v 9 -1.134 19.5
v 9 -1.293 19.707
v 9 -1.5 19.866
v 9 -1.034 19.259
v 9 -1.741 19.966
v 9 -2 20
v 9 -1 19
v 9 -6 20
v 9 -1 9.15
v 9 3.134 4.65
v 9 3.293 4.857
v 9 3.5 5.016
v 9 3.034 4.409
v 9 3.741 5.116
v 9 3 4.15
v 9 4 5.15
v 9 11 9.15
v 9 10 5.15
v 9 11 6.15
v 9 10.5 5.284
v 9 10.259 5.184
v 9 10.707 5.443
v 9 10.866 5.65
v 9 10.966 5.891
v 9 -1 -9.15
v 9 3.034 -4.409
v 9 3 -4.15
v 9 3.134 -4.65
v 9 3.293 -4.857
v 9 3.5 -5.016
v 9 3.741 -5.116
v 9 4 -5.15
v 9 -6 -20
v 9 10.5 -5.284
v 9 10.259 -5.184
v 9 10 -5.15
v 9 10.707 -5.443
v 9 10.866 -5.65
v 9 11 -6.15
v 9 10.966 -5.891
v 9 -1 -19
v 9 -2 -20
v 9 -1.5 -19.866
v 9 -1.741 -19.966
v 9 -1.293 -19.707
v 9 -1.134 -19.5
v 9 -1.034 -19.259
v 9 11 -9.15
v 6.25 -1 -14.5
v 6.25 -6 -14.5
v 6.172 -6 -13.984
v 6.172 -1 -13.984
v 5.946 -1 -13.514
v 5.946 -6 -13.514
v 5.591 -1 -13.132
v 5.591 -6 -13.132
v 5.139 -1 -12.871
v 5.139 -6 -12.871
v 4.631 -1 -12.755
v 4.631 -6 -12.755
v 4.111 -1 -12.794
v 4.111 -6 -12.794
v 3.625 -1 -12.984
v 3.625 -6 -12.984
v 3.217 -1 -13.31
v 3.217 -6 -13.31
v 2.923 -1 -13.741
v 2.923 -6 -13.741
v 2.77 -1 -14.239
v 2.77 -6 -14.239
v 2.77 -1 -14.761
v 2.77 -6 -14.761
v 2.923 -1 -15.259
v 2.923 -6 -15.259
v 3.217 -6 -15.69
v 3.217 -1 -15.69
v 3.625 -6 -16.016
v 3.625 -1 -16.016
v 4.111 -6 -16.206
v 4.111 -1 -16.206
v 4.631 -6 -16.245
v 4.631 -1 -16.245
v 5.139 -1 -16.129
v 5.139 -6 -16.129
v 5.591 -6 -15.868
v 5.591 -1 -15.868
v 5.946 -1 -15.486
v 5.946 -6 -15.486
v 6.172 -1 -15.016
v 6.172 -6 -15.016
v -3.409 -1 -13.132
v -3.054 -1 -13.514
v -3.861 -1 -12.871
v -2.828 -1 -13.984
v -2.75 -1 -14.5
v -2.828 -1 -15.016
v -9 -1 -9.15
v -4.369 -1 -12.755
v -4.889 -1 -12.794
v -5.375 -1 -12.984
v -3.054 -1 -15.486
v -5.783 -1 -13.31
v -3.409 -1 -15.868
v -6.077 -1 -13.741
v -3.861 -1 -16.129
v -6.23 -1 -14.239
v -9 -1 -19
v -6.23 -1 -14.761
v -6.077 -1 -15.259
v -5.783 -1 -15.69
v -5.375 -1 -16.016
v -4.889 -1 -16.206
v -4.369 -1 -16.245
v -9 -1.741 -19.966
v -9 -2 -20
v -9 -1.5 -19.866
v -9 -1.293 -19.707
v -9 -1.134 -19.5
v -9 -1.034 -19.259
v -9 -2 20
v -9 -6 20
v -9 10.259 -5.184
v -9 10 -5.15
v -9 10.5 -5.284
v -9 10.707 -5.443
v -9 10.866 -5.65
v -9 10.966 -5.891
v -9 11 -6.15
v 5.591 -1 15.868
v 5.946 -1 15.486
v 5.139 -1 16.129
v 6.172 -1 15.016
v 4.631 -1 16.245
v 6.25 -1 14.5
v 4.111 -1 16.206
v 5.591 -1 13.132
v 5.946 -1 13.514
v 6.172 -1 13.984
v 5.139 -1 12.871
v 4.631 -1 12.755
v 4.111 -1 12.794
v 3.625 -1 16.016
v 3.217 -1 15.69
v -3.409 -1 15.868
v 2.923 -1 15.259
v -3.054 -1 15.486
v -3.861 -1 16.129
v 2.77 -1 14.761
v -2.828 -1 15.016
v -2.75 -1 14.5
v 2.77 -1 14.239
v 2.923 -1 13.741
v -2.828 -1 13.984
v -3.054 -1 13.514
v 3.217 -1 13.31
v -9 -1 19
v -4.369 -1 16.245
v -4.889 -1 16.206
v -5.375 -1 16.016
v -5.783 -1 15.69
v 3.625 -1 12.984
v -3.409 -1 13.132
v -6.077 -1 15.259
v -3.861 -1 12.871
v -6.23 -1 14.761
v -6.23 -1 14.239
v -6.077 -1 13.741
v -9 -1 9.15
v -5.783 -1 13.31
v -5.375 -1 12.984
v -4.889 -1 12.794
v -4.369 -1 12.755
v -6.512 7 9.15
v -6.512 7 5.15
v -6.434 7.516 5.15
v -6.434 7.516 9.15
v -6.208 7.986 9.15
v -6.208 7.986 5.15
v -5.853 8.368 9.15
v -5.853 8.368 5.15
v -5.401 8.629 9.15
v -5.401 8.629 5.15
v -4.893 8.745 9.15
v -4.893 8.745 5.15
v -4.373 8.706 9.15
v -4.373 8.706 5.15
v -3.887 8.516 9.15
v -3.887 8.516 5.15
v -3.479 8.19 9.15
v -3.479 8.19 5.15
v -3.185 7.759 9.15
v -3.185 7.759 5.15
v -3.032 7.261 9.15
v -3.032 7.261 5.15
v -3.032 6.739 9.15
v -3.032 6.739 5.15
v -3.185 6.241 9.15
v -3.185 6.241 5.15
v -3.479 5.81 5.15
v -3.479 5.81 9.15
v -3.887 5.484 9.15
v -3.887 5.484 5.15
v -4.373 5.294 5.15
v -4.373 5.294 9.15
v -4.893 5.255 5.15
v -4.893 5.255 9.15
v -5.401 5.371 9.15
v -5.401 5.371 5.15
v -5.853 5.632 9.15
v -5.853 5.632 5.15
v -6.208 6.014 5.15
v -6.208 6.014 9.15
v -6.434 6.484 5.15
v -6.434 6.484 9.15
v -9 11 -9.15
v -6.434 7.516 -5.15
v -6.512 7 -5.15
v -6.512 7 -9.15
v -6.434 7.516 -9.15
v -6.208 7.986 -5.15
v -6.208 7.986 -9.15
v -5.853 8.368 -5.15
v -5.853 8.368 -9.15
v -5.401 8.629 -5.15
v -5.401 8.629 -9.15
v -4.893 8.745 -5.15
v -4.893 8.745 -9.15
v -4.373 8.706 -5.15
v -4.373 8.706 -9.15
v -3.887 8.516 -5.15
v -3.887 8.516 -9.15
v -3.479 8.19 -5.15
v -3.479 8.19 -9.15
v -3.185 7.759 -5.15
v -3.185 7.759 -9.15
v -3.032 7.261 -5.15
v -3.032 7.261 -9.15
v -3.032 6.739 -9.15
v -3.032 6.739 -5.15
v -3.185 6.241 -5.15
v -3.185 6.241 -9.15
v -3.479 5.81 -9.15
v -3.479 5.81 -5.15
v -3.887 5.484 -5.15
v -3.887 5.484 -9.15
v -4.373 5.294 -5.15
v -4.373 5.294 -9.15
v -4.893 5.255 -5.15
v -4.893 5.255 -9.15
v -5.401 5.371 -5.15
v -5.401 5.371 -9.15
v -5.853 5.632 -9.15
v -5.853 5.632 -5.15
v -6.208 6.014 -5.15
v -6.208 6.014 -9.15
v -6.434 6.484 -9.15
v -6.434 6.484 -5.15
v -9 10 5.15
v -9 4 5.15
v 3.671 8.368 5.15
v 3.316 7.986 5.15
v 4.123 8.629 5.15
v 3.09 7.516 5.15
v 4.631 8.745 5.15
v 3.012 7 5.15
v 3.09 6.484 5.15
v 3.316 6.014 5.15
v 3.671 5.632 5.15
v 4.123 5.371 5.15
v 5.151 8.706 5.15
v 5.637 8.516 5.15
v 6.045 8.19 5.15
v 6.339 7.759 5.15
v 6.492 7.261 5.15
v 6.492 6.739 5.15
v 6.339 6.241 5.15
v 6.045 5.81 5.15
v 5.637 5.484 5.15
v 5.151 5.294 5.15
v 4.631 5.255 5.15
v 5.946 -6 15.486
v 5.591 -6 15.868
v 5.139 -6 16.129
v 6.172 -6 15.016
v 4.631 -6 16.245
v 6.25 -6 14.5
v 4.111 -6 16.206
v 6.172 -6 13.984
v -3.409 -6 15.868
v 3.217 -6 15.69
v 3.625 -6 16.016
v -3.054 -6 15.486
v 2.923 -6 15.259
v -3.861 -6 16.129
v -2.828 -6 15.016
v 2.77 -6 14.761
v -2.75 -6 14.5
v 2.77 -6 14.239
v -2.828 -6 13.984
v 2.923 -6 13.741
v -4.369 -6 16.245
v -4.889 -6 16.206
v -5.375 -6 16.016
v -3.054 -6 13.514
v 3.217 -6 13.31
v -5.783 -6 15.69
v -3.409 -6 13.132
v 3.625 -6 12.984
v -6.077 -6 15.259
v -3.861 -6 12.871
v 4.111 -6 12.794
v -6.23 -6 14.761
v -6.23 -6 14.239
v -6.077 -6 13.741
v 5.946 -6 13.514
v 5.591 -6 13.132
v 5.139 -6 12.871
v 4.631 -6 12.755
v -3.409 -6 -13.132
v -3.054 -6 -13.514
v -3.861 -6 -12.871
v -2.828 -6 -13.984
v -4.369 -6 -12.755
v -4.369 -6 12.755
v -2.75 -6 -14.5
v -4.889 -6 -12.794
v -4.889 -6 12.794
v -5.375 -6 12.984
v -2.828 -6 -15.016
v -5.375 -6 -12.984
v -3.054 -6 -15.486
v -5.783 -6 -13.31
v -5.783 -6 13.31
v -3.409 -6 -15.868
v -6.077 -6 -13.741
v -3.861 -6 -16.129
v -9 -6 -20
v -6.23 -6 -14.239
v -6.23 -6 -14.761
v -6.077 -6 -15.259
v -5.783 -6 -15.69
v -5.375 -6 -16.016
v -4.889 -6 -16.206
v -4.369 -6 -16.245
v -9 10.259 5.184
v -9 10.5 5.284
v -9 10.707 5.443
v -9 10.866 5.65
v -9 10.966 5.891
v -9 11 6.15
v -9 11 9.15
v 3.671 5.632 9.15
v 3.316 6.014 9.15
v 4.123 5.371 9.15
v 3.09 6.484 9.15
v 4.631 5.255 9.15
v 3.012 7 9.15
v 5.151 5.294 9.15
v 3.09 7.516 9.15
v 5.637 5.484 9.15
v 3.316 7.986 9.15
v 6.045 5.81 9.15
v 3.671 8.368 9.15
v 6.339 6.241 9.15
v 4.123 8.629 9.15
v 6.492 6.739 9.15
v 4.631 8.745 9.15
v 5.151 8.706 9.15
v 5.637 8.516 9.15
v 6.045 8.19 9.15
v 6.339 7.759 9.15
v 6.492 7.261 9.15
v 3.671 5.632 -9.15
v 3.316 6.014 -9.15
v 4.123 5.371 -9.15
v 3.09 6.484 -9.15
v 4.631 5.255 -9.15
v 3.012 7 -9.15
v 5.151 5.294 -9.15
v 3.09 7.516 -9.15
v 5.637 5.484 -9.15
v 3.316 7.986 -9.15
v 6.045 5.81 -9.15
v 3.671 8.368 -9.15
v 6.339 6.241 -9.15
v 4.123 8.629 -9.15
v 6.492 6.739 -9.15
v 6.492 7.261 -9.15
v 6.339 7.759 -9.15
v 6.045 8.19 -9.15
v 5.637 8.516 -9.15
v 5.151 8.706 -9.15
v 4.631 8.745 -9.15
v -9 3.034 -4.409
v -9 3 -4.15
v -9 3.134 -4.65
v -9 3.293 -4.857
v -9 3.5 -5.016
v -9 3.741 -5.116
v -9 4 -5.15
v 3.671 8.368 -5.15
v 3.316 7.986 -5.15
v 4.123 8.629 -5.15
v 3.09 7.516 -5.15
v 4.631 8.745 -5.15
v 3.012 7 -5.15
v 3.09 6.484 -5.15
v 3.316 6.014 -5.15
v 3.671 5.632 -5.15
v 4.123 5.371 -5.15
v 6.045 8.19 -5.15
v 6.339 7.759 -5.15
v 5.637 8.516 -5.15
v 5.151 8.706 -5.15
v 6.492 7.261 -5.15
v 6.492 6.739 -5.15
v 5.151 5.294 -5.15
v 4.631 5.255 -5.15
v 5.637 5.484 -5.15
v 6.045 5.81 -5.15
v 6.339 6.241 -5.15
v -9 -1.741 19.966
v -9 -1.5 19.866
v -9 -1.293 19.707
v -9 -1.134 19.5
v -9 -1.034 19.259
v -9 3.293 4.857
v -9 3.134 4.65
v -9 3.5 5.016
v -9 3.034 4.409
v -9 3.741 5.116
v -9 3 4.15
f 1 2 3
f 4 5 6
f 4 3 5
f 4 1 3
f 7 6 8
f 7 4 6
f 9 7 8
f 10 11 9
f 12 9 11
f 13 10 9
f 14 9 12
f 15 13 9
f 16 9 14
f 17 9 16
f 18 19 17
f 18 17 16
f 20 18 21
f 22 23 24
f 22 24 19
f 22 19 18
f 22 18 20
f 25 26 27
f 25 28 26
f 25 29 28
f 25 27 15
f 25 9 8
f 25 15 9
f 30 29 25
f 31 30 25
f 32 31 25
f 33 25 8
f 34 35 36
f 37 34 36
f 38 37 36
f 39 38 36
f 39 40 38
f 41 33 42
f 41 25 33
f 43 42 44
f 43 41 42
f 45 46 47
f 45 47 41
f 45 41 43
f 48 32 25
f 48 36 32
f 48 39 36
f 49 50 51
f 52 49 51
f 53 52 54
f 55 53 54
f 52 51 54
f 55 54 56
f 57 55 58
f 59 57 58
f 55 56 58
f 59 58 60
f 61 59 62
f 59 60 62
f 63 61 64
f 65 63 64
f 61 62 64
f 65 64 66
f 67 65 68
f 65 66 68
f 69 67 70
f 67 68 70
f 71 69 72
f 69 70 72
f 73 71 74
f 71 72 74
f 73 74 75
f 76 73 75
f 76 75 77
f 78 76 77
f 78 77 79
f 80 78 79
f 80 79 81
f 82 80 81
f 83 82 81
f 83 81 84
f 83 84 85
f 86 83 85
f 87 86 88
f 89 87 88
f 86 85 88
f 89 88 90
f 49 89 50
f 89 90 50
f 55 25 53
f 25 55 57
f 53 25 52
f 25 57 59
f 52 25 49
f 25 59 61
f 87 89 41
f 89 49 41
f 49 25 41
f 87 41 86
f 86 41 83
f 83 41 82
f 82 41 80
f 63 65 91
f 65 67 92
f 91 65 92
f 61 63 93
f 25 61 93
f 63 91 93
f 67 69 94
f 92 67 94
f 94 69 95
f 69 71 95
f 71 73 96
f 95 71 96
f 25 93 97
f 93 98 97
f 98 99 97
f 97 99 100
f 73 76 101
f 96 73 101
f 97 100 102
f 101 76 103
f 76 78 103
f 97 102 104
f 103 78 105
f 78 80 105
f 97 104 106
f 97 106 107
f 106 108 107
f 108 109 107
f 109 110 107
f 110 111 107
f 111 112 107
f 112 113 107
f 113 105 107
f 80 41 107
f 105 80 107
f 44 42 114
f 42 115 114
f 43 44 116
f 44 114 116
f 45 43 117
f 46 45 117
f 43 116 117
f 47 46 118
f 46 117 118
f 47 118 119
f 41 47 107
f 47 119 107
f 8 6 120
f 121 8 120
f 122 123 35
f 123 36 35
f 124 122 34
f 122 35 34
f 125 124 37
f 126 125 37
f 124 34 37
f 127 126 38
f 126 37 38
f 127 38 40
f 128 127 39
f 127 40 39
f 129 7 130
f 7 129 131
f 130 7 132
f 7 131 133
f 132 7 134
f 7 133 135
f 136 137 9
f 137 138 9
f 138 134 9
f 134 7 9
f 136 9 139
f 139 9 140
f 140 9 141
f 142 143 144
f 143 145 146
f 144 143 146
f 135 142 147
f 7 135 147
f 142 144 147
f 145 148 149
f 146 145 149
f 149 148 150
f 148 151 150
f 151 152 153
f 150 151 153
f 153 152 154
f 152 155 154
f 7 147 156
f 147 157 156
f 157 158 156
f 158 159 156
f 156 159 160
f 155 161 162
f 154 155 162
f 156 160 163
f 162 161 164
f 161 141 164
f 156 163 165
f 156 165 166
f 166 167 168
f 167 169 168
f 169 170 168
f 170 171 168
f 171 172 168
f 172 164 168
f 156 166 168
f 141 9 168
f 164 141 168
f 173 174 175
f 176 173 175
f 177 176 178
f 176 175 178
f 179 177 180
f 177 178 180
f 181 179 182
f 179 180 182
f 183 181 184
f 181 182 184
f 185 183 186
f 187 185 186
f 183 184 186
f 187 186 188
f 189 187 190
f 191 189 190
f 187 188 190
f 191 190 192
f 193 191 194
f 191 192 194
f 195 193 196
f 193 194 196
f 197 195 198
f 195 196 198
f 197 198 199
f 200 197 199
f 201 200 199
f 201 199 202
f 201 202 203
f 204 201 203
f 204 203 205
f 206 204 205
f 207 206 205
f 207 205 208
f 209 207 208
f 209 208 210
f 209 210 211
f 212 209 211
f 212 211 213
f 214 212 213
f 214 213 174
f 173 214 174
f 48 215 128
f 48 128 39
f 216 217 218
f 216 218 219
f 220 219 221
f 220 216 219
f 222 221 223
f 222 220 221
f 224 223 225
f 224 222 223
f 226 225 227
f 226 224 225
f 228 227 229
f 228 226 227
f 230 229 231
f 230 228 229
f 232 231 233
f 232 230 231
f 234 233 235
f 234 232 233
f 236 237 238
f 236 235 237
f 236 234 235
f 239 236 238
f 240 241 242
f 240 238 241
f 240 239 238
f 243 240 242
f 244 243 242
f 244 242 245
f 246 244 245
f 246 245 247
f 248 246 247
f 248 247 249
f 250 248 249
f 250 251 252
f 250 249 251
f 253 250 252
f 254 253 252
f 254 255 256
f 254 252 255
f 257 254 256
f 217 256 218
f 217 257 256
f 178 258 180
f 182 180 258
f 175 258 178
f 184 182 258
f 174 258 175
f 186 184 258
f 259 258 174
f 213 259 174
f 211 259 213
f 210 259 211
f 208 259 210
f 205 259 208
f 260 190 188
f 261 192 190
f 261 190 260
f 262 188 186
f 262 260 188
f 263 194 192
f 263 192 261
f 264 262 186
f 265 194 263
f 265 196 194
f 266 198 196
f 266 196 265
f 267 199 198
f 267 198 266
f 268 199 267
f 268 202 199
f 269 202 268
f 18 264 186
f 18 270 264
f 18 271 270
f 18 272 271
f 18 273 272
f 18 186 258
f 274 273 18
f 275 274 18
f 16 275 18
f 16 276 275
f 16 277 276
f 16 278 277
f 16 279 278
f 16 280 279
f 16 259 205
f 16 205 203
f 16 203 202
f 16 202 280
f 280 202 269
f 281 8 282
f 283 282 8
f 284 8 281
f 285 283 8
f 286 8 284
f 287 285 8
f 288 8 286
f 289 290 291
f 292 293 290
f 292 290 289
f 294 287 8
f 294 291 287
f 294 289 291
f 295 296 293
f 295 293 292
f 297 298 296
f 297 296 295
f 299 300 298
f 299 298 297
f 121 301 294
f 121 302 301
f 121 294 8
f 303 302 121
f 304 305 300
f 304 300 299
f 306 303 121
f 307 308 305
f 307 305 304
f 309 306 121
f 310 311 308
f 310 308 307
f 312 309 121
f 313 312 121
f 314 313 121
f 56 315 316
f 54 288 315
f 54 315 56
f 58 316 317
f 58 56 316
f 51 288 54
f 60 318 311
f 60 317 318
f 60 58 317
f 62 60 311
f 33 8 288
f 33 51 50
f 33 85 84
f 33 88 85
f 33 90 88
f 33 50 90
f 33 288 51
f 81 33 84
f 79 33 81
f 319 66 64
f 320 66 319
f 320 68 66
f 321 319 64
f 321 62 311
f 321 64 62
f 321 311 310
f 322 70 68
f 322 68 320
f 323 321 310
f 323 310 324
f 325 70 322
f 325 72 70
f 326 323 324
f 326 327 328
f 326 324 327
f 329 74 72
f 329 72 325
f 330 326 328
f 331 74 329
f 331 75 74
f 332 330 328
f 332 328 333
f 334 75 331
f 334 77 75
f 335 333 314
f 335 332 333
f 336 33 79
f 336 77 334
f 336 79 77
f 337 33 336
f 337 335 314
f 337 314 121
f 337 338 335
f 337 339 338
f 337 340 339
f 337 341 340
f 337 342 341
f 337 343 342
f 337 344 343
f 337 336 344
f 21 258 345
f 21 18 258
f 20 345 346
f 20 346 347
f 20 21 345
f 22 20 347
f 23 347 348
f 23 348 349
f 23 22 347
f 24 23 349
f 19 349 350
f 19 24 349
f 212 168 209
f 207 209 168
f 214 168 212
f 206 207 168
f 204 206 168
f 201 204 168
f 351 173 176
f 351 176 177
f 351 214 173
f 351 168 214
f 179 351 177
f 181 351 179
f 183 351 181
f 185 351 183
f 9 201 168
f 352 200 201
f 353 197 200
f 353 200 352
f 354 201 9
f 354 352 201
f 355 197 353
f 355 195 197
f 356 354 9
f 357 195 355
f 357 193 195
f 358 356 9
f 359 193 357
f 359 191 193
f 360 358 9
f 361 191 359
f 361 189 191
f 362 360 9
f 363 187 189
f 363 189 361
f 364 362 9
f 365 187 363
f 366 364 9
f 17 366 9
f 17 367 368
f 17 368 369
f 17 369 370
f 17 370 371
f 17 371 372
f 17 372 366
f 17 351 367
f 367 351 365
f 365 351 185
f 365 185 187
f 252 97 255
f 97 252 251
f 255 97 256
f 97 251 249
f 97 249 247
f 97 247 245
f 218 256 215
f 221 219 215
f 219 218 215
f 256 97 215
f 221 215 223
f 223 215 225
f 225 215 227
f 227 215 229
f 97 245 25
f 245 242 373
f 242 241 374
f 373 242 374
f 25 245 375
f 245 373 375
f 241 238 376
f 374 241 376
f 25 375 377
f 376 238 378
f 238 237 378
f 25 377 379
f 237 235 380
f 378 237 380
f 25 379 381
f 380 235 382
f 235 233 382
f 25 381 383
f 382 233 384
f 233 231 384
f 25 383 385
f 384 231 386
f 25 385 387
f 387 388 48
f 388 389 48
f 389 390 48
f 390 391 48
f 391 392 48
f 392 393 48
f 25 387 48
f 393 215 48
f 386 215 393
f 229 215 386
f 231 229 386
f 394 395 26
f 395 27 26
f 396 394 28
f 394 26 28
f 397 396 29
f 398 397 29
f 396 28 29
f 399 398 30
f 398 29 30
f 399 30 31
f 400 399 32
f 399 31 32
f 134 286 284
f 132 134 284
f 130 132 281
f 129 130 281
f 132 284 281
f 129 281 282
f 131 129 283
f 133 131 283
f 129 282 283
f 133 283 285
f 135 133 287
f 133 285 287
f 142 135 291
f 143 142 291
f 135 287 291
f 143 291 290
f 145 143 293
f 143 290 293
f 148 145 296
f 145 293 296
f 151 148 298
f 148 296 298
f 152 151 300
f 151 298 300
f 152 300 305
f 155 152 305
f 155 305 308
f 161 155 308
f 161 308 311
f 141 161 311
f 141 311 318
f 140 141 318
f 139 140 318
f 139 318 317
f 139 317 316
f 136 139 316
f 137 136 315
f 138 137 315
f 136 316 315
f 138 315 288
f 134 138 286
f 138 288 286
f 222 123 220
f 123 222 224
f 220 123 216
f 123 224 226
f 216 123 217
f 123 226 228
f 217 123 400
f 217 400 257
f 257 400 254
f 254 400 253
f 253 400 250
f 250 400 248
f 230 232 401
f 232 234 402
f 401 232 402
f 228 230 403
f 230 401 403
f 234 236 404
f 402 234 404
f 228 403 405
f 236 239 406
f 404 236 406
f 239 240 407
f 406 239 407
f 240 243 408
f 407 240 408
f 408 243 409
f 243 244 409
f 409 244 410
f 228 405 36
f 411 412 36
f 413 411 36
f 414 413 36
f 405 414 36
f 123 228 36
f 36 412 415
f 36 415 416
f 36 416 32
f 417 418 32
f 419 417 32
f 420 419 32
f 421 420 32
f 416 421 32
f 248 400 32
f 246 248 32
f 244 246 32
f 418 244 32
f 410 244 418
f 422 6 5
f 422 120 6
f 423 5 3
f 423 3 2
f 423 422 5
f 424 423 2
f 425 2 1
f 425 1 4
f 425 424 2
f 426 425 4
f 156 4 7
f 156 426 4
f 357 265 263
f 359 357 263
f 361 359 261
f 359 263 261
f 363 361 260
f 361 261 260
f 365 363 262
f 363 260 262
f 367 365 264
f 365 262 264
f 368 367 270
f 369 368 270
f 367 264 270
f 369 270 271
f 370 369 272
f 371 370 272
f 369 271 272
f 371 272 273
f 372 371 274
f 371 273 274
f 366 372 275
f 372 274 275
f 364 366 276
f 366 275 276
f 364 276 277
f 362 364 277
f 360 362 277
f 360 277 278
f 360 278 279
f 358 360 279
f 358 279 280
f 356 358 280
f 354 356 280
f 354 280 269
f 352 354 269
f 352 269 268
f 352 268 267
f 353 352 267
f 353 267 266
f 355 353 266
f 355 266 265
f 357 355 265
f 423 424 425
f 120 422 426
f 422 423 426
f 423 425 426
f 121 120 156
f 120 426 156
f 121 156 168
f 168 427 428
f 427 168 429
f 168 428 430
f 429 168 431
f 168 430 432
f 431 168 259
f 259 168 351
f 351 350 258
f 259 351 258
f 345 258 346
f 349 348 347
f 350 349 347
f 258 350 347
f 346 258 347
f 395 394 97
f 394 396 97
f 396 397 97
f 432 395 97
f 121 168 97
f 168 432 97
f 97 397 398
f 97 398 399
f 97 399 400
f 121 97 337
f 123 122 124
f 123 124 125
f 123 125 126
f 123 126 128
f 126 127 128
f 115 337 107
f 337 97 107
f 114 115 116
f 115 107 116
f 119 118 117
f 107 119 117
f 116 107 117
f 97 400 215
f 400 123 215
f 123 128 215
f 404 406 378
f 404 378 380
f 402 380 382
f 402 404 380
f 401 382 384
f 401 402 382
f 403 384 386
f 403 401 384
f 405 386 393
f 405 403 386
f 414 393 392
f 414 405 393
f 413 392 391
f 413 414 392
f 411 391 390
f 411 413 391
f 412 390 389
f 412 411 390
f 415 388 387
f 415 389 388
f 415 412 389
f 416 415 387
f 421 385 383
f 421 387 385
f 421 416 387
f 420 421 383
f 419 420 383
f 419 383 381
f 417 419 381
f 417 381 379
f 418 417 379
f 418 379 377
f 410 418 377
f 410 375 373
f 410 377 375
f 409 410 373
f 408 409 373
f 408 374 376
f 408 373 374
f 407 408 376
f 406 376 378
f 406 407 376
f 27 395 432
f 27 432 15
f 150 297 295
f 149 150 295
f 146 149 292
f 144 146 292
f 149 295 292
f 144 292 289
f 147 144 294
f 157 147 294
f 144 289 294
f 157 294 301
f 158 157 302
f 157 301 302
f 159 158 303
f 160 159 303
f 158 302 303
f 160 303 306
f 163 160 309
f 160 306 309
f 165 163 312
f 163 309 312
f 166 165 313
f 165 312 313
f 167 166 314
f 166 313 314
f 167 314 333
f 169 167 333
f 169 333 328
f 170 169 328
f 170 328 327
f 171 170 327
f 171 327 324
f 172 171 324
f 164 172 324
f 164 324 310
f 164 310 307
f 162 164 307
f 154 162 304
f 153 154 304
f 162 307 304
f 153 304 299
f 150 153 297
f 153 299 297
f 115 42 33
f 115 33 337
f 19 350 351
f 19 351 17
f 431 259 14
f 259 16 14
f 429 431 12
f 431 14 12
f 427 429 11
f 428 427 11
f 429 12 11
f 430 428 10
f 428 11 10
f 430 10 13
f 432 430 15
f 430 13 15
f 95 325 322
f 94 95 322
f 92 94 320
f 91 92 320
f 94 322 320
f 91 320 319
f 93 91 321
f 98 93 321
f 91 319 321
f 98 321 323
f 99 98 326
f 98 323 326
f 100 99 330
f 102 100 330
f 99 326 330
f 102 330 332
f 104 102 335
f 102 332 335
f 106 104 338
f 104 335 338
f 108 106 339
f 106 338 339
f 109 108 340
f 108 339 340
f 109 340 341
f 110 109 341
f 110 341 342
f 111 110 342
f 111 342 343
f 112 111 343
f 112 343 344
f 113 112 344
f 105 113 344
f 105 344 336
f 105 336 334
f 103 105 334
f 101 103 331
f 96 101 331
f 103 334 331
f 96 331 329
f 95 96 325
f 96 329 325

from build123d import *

# Parameters (mm, degrees)
SKETCH1_W               = 18
SKETCH1_H               = 18.3
BOSS_EXTRUDE1_DEPTH     = 3
SKETCH2_W               = 18
SKETCH2_H               = 4
BOSS_EXTRUDE3_DEPTH     = 8
SKETCH3_R               = 1.75
CUT_EXTRUDE2_DEPTH      = 20
CUT_EXTRUDE2_DEPTH_BACK = 13
FILLET1_R               = 1
FILLET2_R               = 1
FILLET3_R               = 1
SKETCH4_W               = 18
SKETCH4_H               = 18.3
BOSS_EXTRUDE4_DEPTH     = 1
SKETCH5_W               = 18
SKETCH5_H               = 40
BOSS_EXTRUDE5_DEPTH     = 5
SKETCH6_R               = 1.75
CUT_EXTRUDE4_DEPTH      = 5
FILLET4_R               = 1
FILLET5_R               = 1


with BuildPart() as part:
    # Sketch1 → Boss-Extrude1 (new body)
    with BuildSketch(Plane(origin=(0, 0, 0), x_dir=(1, 0, 0), z_dir=(0, 1, 0))):
        Rectangle(SKETCH1_W, SKETCH1_H)
    extrude(amount=BOSS_EXTRUDE1_DEPTH)

    # Sketch2 → Boss-Extrude3 (add)
    with BuildSketch(Plane(origin=(0, 3, 0), x_dir=(1, 0, 0), z_dir=(0, 1, 0))):
        with Locations((0, -7.15)):
            Rectangle(SKETCH2_W, SKETCH2_H)
        with Locations((0, 7.15)):
            Rectangle(SKETCH2_W, SKETCH2_H)
    extrude(amount=BOSS_EXTRUDE3_DEPTH)

    # Sketch3 → Cut-Extrude2 (cut, two sides)
    with BuildSketch(Plane(origin=(0, 0, 5.15), x_dir=(-1, 0, 0), z_dir=(0, 0, -1))) as cut_extrude2_sk:
        with Locations((-4.762, 7)):
            Circle(SKETCH3_R)
        with Locations((4.762, 7)):
            Circle(SKETCH3_R)
    extrude(amount=CUT_EXTRUDE2_DEPTH, mode=Mode.SUBTRACT)
    extrude(cut_extrude2_sk.sketch, amount=-CUT_EXTRUDE2_DEPTH_BACK, mode=Mode.SUBTRACT)

    # Fillet1
    fillet1_edges = [part.edges().sort_by_distance(p)[0] for p in [
        (0, 3, 5.15),
    ]]
    fillet(fillet1_edges, radius=FILLET1_R)

    # Fillet2
    fillet2_edges = [part.edges().sort_by_distance(p)[0] for p in [
        (0, 3, -5.15),
    ]]
    fillet(fillet2_edges, radius=FILLET2_R)

    # Fillet3
    fillet3_edges = [part.edges().sort_by_distance(p)[0] for p in [
        (0, 11, 5.15),
        (0, 11, -5.15),
    ]]
    fillet(fillet3_edges, radius=FILLET3_R)

    # Sketch4 → Boss-Extrude4 (add)
    with BuildSketch(Plane.XZ):
        Rectangle(SKETCH4_W, SKETCH4_H)
    extrude(amount=BOSS_EXTRUDE4_DEPTH)

    # Sketch5 → Boss-Extrude5 (add)
    with BuildSketch(Plane(origin=(0, -1, 0), x_dir=(-1, 0, 0), z_dir=(0, -1, 0))):
        Rectangle(SKETCH5_W, SKETCH5_H)
    extrude(amount=BOSS_EXTRUDE5_DEPTH)

    # Sketch6 → Cut-Extrude4 (cut)
    with BuildSketch(Plane.XZ.offset(6)):
        with Locations((4.5, 14.5)):
            Circle(SKETCH6_R)
        with Locations((-4.5, 14.5)):
            Circle(SKETCH6_R)
        with Locations((-4.5, -14.5)):
            Circle(SKETCH6_R)
        with Locations((4.5, -14.5)):
            Circle(SKETCH6_R)
    extrude(amount=-CUT_EXTRUDE4_DEPTH, mode=Mode.SUBTRACT)

    # Fillet4
    fillet4_edges = [part.edges().sort_by_distance(p)[0] for p in [
        (0, -1, -20),
    ]]
    fillet(fillet4_edges, radius=FILLET4_R)

    # Fillet5
    fillet5_edges = [part.edges().sort_by_distance(p)[0] for p in [
        (0, -1, 20),
    ]]
    fillet(fillet5_edges, radius=FILLET5_R)


solid = part.part
